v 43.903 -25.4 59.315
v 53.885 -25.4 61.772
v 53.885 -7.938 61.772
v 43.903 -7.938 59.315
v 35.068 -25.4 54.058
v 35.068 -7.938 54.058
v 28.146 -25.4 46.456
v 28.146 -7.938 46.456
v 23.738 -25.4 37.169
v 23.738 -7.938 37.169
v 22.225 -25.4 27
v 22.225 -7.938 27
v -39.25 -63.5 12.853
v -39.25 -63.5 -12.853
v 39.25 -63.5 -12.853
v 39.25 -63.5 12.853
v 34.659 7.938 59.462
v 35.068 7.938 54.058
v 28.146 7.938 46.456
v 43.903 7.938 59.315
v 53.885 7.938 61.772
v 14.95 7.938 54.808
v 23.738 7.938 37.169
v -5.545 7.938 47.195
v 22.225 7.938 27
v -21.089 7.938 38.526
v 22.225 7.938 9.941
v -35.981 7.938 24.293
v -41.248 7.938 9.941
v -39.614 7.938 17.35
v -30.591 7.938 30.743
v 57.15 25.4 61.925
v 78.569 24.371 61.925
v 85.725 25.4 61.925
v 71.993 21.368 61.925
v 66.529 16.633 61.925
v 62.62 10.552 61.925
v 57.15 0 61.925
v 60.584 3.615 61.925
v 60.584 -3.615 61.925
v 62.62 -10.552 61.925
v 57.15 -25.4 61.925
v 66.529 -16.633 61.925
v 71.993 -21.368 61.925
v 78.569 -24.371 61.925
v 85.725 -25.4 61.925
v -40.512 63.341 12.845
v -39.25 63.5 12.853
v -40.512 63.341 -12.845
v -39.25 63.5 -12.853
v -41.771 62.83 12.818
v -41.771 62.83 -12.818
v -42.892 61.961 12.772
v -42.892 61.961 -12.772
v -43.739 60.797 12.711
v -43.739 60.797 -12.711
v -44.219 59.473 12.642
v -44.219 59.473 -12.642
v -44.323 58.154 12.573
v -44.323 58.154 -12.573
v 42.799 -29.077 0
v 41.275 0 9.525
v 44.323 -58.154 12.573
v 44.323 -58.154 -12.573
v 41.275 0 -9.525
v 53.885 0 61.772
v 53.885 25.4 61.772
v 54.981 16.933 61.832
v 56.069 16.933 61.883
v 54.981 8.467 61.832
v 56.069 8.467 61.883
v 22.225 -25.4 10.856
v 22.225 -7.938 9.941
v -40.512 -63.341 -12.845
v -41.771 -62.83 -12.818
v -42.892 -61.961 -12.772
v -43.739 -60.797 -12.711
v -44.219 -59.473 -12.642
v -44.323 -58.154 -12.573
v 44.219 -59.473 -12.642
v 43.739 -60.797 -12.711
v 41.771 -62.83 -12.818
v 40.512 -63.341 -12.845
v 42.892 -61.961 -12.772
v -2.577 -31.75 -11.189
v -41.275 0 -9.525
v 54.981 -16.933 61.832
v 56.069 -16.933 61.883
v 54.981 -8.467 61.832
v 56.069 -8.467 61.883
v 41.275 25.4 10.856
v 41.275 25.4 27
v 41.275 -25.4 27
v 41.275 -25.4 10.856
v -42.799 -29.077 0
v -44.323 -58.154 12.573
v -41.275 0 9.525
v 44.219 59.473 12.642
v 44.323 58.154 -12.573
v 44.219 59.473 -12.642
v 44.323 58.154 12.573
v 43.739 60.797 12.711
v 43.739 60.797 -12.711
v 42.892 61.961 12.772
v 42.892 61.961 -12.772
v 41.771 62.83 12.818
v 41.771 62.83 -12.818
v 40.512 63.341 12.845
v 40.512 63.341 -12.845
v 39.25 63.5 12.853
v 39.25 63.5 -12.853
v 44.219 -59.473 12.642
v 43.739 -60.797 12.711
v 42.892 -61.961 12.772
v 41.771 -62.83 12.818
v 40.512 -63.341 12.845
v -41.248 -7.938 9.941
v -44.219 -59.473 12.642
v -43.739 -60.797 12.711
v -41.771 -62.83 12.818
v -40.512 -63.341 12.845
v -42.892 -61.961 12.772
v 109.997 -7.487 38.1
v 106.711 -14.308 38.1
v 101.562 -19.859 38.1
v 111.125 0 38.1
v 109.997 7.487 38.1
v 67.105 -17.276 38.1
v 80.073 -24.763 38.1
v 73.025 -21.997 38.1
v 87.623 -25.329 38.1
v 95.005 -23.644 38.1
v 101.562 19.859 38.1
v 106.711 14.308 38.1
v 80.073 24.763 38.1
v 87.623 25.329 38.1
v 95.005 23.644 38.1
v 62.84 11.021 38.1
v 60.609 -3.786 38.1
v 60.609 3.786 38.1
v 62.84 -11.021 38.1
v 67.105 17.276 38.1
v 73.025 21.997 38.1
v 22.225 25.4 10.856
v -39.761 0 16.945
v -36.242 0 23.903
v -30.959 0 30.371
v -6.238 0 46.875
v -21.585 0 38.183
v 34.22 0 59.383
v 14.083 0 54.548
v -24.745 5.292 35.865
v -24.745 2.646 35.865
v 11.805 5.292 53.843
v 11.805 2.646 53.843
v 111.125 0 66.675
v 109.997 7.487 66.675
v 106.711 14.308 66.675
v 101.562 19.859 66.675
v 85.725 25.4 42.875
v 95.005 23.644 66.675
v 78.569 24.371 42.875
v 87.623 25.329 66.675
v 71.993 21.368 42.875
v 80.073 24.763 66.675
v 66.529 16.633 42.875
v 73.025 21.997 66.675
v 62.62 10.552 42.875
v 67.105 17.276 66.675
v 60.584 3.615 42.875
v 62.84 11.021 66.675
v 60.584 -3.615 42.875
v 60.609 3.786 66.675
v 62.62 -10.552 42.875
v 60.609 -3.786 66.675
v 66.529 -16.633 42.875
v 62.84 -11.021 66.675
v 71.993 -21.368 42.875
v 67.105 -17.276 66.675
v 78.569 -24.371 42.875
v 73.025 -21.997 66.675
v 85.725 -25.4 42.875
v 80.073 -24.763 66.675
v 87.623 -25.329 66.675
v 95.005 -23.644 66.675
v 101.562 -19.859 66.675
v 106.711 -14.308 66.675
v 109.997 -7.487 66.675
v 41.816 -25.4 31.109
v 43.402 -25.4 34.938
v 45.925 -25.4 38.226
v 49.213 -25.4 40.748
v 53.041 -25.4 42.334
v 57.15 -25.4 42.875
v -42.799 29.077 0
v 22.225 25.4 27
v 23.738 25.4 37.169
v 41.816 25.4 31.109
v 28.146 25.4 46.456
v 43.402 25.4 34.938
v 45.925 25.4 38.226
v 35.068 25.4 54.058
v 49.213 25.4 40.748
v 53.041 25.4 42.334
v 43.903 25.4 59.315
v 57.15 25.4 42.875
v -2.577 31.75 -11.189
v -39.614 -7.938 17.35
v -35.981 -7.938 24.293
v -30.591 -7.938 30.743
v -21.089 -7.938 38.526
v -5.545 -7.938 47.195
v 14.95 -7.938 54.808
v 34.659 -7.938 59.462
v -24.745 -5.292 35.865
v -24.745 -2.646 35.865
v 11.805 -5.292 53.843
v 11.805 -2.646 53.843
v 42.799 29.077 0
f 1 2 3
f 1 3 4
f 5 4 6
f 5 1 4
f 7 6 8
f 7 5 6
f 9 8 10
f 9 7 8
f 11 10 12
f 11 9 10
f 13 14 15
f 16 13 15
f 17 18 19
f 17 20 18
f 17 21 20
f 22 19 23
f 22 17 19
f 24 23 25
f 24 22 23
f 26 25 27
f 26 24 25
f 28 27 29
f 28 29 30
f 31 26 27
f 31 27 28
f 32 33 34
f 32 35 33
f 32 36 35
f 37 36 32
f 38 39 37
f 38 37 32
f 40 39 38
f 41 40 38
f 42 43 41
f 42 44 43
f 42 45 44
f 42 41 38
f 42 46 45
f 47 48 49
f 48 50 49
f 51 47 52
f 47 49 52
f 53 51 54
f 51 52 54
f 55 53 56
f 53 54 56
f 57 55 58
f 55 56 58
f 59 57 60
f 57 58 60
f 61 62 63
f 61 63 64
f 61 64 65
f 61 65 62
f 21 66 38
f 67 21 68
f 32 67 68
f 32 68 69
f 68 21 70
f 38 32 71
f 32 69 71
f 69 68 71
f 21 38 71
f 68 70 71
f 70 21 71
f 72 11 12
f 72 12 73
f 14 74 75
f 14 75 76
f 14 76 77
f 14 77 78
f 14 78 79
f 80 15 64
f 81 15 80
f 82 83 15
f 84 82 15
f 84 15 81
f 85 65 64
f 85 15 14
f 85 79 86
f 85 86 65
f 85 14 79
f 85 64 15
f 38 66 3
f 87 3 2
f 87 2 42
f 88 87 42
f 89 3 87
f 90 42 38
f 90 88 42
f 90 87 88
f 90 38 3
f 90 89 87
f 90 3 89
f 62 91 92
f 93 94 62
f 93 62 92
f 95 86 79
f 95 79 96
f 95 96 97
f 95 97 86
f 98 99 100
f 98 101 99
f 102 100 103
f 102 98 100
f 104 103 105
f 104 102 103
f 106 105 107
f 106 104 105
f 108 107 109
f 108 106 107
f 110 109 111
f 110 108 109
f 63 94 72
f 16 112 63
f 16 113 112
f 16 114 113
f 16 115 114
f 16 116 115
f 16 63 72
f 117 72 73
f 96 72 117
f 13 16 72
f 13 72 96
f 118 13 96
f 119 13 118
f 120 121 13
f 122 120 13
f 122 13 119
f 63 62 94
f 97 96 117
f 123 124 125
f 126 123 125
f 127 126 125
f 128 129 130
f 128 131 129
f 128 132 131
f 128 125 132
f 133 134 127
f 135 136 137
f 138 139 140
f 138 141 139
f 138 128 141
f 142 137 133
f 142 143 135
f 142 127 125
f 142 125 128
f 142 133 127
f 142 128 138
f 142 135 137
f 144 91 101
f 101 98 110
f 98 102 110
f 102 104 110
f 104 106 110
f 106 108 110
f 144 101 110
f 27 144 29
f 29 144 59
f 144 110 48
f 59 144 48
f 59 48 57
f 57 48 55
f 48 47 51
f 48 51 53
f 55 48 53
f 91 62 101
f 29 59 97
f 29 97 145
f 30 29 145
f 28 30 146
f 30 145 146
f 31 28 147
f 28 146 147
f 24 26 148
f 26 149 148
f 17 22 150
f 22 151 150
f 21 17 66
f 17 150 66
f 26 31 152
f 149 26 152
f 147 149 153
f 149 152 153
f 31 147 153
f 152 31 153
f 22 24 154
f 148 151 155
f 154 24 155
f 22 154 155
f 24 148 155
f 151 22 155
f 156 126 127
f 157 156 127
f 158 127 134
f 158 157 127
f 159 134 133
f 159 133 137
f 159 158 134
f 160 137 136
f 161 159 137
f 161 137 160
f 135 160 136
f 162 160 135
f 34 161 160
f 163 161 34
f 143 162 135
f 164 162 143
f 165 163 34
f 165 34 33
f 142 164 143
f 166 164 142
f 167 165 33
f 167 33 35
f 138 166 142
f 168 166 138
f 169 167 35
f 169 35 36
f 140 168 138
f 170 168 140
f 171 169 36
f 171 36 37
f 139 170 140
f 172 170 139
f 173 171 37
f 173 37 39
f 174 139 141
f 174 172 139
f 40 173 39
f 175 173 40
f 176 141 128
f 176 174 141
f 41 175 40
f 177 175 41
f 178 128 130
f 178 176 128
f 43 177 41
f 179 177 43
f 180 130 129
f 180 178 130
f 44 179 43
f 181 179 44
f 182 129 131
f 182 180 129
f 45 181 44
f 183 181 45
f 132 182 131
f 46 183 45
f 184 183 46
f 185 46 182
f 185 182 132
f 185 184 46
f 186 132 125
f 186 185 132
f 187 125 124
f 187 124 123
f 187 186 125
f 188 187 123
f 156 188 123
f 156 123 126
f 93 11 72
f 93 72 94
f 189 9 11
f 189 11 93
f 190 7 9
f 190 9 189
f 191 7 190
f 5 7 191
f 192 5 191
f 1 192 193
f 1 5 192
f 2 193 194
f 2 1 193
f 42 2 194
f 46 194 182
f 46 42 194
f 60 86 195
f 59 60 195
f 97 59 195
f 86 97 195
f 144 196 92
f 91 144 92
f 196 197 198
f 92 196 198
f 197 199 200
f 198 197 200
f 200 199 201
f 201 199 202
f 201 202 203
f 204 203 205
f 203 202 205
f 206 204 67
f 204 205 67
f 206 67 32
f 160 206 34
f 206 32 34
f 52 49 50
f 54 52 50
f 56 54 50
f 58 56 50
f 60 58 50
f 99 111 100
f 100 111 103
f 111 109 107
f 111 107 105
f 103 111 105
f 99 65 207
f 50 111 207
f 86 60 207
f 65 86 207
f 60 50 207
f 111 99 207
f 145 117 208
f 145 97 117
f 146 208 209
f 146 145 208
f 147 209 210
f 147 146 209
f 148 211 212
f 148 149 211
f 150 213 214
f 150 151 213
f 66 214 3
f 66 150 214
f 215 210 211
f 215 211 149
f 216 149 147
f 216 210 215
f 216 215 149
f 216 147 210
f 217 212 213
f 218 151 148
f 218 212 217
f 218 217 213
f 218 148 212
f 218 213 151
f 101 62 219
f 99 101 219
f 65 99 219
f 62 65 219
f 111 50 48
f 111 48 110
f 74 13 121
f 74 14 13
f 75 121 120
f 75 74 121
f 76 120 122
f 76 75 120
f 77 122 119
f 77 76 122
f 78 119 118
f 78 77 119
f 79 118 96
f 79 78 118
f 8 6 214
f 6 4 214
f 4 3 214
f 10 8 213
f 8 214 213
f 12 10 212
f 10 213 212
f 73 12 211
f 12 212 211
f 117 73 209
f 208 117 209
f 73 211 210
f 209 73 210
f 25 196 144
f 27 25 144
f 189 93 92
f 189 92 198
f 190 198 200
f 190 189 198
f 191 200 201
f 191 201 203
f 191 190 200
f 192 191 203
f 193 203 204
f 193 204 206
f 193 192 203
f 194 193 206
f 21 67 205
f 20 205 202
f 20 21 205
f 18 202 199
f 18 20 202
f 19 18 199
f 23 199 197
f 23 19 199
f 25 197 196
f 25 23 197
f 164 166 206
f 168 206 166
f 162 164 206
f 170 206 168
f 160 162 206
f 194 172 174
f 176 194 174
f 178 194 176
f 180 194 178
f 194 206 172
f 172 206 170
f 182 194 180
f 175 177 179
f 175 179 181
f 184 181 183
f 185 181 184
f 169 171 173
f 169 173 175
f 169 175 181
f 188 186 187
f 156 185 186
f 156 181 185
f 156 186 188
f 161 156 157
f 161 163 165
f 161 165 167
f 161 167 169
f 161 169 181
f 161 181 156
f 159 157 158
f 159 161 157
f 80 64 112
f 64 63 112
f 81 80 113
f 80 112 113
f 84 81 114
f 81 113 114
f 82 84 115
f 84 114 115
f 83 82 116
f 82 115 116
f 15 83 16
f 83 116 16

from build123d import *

# Parameters (mm, degrees)
F1_DEPTH = 63.5
F1_TAPER = -3
F0_W     = 25.4
F0_H     = 19.05
F2_DEPTH = 25.4
F3_DEPTH = 7.9375
F5_R     = 5.08


with BuildPart() as f1:
    # F0 (on Front) → F1 (new body, symmetric)
    with BuildSketch(Plane.XZ):
        Polygon((22.225, 9.525), (-41.275, 9.525), (-41.275, -9.525), (41.275, -9.525), (41.275, 9.525), align=None)
    extrude(amount=F1_DEPTH, both=True, taper=F1_TAPER)

    # F0 (on Front) → F2 (join, symmetric)
    with BuildSketch(Plane.XZ):
        with BuildLine():
            Line((22.225, 27.0002), (22.225, 9.525))
            Line((22.225, 9.525), (41.275, 9.525))
            Line((41.275, 9.525), (41.275, 27.0002))
            ThreePointArc((41.275, 27.0002), (45.9246798487, 38.2255201513), (57.15, 42.8752))
            Line((57.15, 42.8752), (60.325, 42.8752))
            Line((60.325, 42.8752), (60.325, 61.9252))
            Line((60.325, 61.9252), (57.15, 61.9252))
            add(Edge.make_bspline(
                [(53.8854342407, 61.7722898912), (54.9842067368, 61.8365871986), (56.0728453275, 61.8876096574), (57.15, 61.9252)],
                knots=[108.5245810491, 108.5245810491, 108.5245810491, 108.5245810491, 111.5045361635, 111.5045361635, 111.5045361635, 111.5045361635], degree=3))
            ThreePointArc((53.8854342407, 61.7722898912), (31.3258777096, 50.5133948686), (22.225, 27.0002))
        make_face()
        with Locations((73.025, 52.4002)):
            Rectangle(F0_W, F0_H)
    extrude(amount=F2_DEPTH, both=True)

    # F0 (on Front) → F3 (join, symmetric)
    with BuildSketch(Plane.XZ):
        with BuildLine():
            add(Edge.make_bspline(
                [(-41.275, 9.525), (-39.5856284224, 39.4828766469), (13.870125209, 59.4306981306), (53.8854342407, 61.7722898912)],
                knots=[0, 0, 0, 0, 108.5245810491, 108.5245810491, 108.5245810491, 108.5245810491], degree=3))
            Line((-41.275, 9.525), (22.225, 9.525))
            Line((22.225, 9.525), (22.225, 27.0002))
            ThreePointArc((22.225, 27.0002), (31.3258777096, 50.5133948686), (53.8854342407, 61.7722898912))
        make_face()
    extrude(amount=F3_DEPTH, both=True)

    # F0 (on Front) → F4 (revolve)
    with BuildSketch(Plane.XZ):
        Polygon((85.725, 66.675), (85.725, 61.9252), (85.725, 42.8752), (85.725, 38.1), (111.125, 38.1), (111.125, 66.675), align=None)
    revolve(axis=Axis((85.725, 0, 52.3875), (0, 0, 1)))

    # F5
    f5_edges = [f1.edges().sort_by_distance(p)[0] for p in [
        (44.602894, -63.5, 0),
        (-44.602894, -63.5, 0),
        (44.602894, 63.5, 0),
        (-44.602894, 63.5, 0),
    ]]
    fillet(f5_edges, radius=F5_R)


solid = f1.part
